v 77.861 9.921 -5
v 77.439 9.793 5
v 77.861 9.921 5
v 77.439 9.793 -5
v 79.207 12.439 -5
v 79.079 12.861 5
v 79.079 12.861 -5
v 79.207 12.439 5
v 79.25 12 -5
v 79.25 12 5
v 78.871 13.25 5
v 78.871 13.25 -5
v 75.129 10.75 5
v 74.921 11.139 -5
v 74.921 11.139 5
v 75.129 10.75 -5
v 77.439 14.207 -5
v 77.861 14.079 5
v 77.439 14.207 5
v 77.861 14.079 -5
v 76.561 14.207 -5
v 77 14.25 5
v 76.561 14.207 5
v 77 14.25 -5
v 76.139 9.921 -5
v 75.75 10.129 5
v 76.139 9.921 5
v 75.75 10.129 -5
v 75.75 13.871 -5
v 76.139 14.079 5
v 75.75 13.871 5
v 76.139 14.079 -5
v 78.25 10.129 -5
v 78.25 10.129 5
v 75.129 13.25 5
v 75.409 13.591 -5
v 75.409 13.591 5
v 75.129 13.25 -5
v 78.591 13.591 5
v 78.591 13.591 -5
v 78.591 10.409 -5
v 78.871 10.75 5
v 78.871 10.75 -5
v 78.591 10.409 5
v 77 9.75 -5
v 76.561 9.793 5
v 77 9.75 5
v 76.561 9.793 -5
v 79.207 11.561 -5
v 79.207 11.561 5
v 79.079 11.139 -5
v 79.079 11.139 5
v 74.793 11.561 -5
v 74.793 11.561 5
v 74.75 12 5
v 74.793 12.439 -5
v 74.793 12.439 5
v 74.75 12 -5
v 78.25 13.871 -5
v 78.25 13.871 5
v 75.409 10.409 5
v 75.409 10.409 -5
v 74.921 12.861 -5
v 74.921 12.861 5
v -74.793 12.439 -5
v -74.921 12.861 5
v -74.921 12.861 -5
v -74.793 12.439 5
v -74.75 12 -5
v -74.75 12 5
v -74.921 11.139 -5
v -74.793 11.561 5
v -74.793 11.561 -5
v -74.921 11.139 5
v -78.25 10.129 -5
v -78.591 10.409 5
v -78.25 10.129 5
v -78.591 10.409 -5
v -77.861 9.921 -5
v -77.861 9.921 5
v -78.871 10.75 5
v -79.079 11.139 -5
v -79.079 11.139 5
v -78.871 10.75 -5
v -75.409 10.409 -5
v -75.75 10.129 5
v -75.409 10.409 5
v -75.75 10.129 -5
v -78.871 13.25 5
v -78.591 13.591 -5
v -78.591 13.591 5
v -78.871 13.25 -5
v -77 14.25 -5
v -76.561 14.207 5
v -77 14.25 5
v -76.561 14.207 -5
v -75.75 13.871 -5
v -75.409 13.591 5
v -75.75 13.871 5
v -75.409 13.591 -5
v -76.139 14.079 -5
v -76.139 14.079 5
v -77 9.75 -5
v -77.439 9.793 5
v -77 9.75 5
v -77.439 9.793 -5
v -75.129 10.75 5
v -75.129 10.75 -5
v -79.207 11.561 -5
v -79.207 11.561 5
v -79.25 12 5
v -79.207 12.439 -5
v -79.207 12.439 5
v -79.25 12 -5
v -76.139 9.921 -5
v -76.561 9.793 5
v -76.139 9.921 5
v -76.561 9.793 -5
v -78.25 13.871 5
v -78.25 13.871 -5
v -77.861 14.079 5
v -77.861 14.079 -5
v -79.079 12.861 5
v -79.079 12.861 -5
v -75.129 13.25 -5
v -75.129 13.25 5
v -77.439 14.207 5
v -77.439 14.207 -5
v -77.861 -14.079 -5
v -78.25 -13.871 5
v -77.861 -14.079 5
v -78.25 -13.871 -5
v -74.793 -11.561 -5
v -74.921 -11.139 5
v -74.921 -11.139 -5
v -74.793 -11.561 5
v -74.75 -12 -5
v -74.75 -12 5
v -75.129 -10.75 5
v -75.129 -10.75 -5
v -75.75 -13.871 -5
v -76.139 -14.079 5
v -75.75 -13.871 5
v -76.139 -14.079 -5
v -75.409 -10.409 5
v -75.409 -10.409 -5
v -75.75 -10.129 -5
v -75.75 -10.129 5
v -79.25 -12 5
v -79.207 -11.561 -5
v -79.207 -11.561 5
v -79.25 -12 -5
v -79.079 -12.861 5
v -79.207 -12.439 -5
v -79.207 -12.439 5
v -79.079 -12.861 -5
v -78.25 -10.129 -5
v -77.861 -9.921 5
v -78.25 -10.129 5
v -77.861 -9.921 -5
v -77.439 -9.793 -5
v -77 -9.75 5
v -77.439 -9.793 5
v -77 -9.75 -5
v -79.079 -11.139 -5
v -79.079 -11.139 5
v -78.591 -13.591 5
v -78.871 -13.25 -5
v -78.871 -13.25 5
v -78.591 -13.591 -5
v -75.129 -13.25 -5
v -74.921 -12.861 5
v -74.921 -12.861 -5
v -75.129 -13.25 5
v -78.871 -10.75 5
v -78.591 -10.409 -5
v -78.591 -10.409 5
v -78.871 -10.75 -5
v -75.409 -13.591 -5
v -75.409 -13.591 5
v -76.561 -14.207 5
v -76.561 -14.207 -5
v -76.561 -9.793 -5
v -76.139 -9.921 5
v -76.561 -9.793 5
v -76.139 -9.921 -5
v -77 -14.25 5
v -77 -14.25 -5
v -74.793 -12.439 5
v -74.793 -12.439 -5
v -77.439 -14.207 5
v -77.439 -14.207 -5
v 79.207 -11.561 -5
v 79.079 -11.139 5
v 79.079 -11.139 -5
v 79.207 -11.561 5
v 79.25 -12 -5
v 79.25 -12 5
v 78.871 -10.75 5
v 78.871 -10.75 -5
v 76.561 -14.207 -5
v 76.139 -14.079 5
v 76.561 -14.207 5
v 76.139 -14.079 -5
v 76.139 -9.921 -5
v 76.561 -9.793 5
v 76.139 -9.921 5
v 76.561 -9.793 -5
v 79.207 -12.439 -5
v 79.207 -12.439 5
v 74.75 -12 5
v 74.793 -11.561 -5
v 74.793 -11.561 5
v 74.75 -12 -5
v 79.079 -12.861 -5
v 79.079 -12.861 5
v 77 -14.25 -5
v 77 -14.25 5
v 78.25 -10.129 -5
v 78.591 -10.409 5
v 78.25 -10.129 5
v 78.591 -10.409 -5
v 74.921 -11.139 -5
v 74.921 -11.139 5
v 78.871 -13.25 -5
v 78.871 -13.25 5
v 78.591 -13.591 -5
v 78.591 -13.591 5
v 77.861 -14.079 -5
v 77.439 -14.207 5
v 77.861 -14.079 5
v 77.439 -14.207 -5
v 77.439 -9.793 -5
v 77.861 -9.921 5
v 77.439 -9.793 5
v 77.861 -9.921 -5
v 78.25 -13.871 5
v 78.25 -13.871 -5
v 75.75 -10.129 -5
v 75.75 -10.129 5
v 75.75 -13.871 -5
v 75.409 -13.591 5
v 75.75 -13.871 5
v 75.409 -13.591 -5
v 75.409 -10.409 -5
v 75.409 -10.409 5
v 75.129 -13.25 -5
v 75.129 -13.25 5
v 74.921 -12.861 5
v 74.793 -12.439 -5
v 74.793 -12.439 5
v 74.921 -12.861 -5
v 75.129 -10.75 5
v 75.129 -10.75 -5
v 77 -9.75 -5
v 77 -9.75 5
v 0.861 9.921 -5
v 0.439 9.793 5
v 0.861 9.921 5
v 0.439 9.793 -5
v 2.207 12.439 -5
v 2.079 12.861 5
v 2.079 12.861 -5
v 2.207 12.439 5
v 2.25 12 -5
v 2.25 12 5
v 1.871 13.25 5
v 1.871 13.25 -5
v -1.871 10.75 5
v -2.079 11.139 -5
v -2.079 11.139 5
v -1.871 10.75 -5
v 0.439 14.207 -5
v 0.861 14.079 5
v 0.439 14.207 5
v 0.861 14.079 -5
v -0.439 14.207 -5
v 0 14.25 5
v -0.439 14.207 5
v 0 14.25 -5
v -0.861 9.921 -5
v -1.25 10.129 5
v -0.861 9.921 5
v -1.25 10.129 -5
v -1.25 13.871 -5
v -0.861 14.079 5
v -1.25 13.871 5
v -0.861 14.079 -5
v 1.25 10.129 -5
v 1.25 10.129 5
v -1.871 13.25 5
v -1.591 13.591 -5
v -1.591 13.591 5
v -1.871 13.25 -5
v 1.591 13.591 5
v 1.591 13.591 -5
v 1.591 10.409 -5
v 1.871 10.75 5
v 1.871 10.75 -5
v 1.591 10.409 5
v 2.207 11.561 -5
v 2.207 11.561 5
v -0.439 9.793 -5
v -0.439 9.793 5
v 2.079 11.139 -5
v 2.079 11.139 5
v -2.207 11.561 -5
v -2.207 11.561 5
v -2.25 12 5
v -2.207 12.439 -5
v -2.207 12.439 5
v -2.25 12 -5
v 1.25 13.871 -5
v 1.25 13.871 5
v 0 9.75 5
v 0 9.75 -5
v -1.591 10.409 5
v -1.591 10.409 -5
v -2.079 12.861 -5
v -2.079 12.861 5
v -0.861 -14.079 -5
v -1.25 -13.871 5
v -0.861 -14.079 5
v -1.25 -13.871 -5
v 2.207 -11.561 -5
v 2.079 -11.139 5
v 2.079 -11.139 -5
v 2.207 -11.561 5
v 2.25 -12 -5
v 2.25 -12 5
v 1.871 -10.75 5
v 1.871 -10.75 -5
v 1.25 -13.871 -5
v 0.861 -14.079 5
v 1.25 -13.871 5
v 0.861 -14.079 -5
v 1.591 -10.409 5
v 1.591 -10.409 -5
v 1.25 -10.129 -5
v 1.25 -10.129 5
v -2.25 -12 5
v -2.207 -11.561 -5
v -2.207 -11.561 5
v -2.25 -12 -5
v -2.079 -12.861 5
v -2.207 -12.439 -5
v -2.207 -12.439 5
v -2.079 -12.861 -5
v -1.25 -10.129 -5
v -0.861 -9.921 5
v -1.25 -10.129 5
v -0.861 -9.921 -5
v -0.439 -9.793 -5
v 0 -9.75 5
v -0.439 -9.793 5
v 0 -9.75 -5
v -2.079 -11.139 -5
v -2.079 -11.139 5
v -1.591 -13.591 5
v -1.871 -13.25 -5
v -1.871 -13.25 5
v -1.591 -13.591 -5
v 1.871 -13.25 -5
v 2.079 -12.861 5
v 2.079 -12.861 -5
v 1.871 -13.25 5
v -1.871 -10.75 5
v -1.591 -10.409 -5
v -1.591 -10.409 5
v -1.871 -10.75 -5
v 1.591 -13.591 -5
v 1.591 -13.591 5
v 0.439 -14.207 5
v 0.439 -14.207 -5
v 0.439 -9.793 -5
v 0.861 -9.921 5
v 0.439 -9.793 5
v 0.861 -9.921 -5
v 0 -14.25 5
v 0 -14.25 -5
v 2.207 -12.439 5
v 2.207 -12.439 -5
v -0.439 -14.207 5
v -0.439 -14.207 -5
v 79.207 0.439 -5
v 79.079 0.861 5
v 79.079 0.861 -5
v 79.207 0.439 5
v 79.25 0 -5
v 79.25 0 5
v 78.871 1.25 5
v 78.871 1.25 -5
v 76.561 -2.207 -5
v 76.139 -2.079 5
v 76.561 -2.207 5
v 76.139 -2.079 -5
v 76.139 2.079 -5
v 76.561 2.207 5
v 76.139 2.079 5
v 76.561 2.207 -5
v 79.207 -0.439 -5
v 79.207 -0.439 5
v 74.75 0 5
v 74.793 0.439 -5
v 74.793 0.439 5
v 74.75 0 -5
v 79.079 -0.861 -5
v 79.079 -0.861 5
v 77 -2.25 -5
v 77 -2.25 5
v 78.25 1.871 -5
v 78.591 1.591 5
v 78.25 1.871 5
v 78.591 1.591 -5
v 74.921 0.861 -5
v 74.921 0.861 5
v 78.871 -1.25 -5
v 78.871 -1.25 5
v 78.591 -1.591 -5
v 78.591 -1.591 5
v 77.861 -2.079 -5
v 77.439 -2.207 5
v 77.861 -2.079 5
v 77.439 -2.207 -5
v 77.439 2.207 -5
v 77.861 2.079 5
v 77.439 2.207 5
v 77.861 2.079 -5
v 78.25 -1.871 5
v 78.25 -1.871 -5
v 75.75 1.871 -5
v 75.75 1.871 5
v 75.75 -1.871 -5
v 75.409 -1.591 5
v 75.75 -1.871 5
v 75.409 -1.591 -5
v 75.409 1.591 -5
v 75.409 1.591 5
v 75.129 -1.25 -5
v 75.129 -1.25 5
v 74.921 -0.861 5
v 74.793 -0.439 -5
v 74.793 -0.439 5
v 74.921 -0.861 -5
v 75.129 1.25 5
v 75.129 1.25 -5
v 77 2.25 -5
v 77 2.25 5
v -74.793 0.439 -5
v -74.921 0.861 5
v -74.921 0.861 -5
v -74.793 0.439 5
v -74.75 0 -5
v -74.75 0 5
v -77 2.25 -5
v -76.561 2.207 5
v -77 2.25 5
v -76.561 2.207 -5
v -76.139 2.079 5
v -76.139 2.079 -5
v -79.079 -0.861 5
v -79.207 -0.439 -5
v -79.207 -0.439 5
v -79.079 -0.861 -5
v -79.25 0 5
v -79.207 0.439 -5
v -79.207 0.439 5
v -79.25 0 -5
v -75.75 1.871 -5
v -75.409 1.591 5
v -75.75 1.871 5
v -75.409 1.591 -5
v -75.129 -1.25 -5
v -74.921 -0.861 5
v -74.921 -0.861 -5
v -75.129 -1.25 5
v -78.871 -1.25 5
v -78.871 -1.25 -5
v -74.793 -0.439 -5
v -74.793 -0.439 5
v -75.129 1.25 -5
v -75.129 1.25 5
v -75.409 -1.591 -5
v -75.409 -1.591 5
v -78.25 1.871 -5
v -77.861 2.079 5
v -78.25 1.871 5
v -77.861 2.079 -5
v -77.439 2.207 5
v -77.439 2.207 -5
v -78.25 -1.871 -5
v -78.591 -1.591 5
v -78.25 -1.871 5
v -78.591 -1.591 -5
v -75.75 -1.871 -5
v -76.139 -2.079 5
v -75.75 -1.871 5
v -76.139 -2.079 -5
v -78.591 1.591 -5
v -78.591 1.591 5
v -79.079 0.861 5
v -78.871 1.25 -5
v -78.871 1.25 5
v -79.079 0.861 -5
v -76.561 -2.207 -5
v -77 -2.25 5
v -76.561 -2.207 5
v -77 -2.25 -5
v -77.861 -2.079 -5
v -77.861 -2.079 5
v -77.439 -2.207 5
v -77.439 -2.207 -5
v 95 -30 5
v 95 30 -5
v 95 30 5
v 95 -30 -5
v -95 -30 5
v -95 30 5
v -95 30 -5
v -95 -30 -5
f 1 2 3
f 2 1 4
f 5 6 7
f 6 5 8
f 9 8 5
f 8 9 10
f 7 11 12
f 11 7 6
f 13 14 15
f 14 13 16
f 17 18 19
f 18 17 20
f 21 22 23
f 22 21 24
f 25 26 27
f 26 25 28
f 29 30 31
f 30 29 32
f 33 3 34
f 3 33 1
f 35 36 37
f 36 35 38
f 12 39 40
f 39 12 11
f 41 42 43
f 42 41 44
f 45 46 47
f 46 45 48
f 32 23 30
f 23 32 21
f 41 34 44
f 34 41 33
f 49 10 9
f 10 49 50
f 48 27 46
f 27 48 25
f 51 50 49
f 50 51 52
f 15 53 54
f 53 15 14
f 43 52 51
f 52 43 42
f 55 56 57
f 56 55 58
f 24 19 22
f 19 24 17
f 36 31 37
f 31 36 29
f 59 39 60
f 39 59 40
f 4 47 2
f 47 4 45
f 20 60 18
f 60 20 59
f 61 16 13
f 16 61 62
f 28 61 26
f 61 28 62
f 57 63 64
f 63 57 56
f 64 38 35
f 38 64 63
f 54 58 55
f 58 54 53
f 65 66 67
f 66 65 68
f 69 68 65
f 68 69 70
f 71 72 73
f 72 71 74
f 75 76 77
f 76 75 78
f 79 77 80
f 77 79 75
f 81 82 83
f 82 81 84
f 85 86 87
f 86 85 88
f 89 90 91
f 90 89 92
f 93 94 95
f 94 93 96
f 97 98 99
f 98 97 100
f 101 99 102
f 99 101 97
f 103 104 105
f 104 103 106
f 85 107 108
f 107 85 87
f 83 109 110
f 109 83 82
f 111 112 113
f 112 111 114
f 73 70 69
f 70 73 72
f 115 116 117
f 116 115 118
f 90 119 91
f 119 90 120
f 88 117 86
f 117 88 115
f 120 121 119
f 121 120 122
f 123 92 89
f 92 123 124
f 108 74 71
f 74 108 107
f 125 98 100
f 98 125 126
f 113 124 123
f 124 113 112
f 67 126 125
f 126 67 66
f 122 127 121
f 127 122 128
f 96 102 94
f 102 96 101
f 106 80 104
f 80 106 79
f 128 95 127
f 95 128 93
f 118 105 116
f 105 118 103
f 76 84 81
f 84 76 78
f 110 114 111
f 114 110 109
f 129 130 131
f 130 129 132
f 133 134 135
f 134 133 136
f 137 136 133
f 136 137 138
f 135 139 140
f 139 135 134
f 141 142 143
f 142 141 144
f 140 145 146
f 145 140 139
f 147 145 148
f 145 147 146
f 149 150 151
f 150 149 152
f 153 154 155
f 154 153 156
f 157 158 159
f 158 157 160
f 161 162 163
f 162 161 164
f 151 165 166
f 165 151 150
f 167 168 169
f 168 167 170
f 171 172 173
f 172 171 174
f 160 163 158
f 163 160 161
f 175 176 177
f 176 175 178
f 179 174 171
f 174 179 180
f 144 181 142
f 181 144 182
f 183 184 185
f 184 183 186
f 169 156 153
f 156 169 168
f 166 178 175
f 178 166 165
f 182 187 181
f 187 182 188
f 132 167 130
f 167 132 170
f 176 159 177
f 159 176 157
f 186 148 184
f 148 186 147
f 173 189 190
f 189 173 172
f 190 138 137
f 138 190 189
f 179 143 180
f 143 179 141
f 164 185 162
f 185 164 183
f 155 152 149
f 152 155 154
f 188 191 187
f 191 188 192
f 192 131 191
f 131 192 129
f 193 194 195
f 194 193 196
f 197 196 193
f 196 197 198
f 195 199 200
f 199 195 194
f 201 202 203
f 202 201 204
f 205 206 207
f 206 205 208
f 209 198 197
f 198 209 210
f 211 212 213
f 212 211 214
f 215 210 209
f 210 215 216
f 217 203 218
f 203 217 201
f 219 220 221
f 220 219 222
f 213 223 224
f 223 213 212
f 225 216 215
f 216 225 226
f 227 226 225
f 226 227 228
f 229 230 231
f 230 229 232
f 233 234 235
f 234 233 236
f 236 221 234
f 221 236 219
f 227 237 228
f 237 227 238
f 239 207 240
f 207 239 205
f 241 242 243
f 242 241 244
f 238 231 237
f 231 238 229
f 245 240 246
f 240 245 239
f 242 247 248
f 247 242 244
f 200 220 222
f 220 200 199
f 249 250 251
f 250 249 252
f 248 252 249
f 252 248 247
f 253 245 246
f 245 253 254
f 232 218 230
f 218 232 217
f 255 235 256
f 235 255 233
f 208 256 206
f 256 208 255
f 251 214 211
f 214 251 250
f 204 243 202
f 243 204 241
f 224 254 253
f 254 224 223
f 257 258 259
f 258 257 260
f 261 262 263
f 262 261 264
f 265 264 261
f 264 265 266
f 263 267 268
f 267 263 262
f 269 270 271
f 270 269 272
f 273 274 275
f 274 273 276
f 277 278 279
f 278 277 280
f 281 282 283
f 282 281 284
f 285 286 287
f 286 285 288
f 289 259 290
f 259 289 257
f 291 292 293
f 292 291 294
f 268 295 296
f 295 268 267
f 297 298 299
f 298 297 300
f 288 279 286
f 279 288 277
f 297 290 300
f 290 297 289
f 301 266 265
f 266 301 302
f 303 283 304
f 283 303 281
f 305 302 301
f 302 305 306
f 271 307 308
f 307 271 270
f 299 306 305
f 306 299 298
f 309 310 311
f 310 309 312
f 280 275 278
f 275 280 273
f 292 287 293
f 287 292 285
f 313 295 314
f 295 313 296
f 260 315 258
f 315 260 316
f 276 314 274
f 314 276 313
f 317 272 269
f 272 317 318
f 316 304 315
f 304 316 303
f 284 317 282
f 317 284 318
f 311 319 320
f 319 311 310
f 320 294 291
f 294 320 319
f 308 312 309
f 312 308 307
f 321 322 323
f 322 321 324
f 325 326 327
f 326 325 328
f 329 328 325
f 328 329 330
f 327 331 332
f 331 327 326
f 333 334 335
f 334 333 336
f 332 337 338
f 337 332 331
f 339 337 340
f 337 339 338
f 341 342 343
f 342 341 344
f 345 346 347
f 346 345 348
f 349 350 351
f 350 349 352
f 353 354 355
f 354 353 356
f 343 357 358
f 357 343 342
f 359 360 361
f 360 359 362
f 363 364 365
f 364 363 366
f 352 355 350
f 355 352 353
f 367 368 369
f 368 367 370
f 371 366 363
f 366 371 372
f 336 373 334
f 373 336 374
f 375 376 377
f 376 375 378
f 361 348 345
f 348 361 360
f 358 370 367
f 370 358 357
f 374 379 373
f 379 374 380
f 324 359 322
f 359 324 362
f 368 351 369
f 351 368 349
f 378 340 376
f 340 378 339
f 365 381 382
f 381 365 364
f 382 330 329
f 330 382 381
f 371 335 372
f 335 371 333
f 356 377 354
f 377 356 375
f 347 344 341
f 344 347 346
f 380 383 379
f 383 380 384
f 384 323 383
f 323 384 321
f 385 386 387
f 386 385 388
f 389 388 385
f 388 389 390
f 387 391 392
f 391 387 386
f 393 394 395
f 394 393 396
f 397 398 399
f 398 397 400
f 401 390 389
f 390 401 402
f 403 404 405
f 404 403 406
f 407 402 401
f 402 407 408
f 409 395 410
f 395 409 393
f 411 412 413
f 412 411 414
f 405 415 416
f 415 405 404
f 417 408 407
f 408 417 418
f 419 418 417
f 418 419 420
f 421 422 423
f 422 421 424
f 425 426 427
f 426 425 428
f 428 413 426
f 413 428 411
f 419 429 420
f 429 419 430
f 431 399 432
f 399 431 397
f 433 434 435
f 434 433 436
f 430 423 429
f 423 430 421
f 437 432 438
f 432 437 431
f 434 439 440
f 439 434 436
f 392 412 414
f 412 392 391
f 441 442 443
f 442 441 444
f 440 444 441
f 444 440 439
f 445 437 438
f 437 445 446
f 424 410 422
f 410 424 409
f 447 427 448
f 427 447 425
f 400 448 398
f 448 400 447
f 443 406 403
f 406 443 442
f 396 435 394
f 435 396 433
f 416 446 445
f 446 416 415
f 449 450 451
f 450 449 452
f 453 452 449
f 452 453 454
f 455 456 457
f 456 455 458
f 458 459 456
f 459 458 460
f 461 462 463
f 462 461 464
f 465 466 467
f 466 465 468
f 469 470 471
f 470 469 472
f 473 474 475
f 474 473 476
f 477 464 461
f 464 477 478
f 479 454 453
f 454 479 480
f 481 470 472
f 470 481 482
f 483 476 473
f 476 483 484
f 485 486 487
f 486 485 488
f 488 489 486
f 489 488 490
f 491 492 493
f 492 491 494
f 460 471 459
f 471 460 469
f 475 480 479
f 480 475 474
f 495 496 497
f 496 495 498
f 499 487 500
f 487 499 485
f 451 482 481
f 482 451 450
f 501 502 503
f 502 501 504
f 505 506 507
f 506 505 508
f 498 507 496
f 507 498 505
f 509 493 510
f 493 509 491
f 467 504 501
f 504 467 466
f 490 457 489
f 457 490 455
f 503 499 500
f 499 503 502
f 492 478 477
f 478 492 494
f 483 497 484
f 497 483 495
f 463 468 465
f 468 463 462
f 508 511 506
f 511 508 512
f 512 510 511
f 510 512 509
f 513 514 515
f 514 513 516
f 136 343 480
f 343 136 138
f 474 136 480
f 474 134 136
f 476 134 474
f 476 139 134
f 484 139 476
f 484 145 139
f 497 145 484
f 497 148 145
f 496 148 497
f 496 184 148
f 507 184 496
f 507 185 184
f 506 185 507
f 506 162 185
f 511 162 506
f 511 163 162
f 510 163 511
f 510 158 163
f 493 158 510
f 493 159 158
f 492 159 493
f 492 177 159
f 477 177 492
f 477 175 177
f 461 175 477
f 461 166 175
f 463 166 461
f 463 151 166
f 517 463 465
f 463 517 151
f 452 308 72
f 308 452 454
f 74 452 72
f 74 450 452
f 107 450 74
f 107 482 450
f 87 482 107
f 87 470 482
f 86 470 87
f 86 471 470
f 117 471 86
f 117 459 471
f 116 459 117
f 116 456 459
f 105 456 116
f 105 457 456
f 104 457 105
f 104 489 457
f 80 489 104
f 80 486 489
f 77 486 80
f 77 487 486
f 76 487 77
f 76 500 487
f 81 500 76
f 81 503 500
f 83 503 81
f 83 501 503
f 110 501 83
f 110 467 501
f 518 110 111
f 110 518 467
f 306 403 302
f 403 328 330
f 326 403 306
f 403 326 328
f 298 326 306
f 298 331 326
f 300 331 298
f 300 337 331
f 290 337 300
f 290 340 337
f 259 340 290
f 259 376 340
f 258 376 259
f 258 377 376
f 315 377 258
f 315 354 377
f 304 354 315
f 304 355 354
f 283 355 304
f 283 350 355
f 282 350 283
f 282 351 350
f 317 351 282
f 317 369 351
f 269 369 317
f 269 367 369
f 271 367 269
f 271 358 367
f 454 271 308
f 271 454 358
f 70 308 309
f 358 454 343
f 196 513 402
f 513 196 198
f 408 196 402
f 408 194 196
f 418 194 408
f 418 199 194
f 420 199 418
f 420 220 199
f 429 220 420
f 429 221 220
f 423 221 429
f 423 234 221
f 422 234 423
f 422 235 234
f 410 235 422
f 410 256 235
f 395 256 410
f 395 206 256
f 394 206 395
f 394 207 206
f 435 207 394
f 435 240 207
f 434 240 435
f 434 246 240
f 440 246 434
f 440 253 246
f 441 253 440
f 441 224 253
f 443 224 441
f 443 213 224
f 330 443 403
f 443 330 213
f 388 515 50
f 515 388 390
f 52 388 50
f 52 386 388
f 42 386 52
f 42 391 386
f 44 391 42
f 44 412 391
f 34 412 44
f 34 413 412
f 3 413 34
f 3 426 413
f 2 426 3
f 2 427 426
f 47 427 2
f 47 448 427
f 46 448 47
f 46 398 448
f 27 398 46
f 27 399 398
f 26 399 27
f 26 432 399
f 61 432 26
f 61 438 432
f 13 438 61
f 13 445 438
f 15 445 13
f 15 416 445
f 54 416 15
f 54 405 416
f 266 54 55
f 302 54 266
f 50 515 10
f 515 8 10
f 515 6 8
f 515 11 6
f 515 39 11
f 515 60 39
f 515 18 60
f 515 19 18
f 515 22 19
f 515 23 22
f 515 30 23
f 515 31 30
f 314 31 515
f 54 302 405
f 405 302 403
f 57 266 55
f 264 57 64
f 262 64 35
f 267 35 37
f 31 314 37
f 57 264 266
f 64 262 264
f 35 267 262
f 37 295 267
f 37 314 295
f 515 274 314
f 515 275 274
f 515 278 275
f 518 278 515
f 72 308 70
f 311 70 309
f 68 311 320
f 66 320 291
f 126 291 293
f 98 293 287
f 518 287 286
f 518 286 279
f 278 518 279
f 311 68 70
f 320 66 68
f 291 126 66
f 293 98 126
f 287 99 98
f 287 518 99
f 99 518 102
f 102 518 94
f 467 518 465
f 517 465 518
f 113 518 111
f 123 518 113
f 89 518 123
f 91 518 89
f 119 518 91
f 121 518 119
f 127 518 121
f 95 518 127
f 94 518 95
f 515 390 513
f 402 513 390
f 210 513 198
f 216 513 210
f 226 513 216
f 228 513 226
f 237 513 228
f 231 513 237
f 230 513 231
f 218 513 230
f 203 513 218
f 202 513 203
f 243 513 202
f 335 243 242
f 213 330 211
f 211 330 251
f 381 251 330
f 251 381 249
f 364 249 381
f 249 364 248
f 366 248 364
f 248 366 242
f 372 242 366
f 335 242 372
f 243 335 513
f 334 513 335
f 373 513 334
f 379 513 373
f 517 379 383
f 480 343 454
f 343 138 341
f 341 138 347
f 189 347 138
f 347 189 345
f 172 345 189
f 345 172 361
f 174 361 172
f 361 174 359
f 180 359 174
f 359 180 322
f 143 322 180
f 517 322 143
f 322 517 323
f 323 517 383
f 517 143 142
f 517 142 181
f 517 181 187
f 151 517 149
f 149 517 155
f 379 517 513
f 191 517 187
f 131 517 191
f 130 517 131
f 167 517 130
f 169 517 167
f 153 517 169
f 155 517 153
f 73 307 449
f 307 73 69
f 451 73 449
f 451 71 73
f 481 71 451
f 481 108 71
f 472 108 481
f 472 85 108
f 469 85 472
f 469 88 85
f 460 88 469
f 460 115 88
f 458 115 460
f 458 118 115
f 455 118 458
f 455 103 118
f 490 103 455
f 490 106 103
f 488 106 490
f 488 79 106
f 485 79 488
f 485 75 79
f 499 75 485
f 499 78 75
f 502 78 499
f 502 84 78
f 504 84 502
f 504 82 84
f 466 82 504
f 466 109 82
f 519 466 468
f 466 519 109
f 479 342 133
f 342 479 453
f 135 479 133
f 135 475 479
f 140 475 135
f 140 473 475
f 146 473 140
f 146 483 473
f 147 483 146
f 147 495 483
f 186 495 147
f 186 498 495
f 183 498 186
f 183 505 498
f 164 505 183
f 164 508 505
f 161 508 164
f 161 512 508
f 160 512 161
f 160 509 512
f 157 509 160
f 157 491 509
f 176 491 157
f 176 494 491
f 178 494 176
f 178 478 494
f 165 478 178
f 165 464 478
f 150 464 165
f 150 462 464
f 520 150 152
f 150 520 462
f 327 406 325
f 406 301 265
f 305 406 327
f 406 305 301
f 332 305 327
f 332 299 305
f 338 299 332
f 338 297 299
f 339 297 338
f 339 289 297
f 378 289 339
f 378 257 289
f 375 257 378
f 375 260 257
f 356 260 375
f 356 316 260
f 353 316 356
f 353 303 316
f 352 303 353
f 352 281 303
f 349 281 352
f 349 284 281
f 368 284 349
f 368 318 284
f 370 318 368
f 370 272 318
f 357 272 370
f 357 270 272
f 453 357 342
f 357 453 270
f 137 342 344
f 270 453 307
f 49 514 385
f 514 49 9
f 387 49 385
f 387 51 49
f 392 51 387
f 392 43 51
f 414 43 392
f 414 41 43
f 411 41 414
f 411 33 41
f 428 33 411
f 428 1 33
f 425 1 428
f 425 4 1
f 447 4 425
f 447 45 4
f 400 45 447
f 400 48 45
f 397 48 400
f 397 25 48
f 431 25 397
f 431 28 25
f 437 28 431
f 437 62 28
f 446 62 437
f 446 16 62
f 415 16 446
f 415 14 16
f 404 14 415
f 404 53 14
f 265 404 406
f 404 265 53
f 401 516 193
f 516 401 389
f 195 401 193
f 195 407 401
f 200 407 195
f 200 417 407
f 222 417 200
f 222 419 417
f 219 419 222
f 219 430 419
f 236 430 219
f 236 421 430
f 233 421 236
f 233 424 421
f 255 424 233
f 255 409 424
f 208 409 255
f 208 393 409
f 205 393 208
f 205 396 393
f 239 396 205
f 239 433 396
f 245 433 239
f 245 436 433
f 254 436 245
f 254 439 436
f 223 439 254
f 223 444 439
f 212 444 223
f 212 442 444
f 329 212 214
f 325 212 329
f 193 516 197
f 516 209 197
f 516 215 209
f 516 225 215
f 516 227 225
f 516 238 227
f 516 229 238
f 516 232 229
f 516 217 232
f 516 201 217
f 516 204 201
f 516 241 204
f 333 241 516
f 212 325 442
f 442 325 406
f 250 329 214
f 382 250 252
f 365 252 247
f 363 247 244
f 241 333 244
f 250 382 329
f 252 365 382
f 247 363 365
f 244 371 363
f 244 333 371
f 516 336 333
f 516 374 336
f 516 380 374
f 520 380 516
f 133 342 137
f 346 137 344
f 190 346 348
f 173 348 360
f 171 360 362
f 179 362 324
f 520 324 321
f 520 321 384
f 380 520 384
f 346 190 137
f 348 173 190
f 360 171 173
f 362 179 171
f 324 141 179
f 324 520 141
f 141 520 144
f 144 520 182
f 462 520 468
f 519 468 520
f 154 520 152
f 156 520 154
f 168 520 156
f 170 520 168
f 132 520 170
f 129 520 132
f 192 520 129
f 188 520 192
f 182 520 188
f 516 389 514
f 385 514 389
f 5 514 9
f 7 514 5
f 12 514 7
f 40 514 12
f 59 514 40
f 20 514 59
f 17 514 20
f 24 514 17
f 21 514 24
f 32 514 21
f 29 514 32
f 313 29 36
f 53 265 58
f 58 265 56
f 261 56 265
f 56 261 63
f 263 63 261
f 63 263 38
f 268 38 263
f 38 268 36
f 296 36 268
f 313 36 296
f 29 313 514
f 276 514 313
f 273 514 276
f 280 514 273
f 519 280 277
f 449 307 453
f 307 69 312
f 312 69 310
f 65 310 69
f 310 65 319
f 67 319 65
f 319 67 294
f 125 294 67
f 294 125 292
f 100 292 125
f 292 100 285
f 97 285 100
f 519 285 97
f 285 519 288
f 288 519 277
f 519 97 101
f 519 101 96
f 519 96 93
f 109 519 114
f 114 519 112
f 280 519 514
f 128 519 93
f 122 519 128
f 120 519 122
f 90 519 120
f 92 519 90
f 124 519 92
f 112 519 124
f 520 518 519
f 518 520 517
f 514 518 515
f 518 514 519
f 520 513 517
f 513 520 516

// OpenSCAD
$fn = 32;

// ----------------------------------------------------------------------
// Corner plate 190 x 60 x 10
// 8 holes, centres taken from the edge offset
// ----------------------------------------------------------------------

// --- parameters (mm) ---
plate = [190, 60, 10];  // overall size (x, y, z)
holes = 8;              // number of holes the drawing asks for
hole_d = 4.5;           // hole diameter
edge = 18;              // hole centre offset from the plate edge

// --- derived feature positions (mm) ---
corner_x = plate[0] / 2 - edge;  // = 77   corner hole X
corner_y = plate[1] / 2 - edge;  // = 12   corner hole Y
feature_centers = [
  [corner_x, corner_y],
  [-corner_x, corner_y],
  [-corner_x, -corner_y],
  [corner_x, -corner_y],
  [0, corner_y],
  [0, -corner_y],
  [corner_x, 0],
  [-corner_x, 0]
];   // hole centres the loop below drills

// plate outline, every hole drilled through with the same cutters
difference() {
  cube(plate, center = true);
  for (centre = feature_centers)
    translate([centre[0], centre[1], 0])
      cylinder(d = hole_d, h = plate[2] + 2, center = true);
}
